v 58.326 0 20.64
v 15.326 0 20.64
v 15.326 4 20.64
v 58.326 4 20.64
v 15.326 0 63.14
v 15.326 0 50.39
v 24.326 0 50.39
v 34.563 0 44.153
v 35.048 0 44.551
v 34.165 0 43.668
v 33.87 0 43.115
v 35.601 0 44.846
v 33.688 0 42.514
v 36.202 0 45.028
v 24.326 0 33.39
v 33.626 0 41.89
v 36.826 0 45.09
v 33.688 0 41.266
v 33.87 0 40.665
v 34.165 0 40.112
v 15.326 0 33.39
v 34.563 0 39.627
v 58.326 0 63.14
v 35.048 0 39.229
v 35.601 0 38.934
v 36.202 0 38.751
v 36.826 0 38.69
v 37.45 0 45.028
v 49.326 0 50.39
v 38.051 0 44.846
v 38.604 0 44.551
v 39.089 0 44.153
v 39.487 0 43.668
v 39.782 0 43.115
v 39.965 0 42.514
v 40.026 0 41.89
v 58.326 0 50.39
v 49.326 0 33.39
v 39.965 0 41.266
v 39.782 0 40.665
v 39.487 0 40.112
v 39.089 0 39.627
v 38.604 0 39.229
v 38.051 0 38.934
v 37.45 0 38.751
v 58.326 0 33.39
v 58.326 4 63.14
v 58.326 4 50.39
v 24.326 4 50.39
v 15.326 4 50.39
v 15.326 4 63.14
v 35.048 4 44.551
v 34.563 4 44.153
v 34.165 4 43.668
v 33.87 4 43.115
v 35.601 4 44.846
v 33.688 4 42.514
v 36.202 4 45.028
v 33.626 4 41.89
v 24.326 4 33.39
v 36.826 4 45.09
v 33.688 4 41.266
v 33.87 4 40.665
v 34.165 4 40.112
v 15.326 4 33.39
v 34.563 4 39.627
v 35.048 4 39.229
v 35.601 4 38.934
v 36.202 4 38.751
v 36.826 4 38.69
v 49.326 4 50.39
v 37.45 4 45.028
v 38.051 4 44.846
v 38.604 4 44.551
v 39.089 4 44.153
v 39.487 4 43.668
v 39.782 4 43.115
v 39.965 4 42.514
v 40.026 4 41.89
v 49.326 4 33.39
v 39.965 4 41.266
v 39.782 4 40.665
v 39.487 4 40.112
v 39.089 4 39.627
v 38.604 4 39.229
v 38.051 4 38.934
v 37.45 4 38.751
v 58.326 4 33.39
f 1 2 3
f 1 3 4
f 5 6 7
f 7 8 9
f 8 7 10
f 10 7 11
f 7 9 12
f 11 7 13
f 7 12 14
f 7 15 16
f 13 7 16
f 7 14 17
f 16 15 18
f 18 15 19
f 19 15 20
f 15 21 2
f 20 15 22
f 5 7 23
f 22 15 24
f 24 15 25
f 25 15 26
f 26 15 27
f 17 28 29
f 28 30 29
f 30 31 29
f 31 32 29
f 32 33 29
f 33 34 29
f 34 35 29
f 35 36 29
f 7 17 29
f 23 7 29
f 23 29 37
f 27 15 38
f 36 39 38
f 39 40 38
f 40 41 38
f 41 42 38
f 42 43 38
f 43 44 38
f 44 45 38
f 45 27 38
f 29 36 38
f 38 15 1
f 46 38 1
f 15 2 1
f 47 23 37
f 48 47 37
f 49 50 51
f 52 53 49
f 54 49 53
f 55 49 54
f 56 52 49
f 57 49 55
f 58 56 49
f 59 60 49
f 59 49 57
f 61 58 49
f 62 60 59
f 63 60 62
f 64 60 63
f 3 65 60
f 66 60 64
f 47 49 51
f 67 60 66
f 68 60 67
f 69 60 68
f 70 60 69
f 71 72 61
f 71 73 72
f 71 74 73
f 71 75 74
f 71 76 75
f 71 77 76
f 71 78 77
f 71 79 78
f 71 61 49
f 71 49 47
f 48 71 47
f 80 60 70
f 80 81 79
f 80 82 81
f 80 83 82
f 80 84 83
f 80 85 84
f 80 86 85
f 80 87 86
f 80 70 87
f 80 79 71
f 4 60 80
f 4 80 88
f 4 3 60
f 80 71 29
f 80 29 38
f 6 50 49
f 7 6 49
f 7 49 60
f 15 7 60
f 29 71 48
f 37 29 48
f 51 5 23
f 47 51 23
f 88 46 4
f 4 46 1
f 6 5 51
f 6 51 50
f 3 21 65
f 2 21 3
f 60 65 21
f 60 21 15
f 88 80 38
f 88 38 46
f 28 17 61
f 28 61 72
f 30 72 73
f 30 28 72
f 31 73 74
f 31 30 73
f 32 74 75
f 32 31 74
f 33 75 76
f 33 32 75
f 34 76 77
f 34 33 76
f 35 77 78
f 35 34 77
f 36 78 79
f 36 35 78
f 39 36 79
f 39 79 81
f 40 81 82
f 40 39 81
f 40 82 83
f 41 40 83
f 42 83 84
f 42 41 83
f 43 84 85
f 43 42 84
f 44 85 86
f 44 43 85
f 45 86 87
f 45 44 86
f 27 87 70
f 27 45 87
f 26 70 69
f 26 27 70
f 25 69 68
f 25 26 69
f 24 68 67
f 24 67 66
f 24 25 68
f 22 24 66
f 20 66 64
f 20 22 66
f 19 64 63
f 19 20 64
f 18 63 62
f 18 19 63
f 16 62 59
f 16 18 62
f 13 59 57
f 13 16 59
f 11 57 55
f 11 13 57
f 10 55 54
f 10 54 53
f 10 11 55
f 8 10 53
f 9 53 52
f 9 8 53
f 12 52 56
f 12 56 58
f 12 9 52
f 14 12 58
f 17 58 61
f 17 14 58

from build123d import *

# Parameters (mm, degrees)
SKETCH_1_W          = 43
SKETCH_1_H          = 42.5
SKETCH_1_R          = 3.2
EXTRUDE_1_DEPTH     = 4
SKETCH_2_W          = 9
SKETCH_2_H          = 17
CUT_EXTRUDE_1_DEPTH = 4


with BuildPart() as part:
    # Эскиз1 → Бобышка-Вытянуть1 (new body)
    with BuildSketch(Plane(origin=(0, 0, 0), x_dir=(1, 0, 0), z_dir=(0, 1, 0))):
        with Locations((36.826052882, -41.88992321)):
            Rectangle(SKETCH_1_W, SKETCH_1_H)
        with Locations(Location((36.826052882, -41.88992321, 0), (0, 0, 270))):
            Circle(SKETCH_1_R, mode=Mode.SUBTRACT)
    extrude(amount=EXTRUDE_1_DEPTH)

    # Эскиз2 → Вырез-Вытянуть1 (cut)
    with BuildSketch(Plane(origin=(0, 4, 0), x_dir=(1, 0, 0), z_dir=(0, 1, 0))):
        with Locations((19.826052882, -41.88992321)):
            Rectangle(SKETCH_2_W, SKETCH_2_H)
        with Locations((53.826052882, -41.88992321)):
            Rectangle(SKETCH_2_W, SKETCH_2_H)
    extrude(amount=-CUT_EXTRUDE_1_DEPTH, mode=Mode.SUBTRACT)


solid = part.part
